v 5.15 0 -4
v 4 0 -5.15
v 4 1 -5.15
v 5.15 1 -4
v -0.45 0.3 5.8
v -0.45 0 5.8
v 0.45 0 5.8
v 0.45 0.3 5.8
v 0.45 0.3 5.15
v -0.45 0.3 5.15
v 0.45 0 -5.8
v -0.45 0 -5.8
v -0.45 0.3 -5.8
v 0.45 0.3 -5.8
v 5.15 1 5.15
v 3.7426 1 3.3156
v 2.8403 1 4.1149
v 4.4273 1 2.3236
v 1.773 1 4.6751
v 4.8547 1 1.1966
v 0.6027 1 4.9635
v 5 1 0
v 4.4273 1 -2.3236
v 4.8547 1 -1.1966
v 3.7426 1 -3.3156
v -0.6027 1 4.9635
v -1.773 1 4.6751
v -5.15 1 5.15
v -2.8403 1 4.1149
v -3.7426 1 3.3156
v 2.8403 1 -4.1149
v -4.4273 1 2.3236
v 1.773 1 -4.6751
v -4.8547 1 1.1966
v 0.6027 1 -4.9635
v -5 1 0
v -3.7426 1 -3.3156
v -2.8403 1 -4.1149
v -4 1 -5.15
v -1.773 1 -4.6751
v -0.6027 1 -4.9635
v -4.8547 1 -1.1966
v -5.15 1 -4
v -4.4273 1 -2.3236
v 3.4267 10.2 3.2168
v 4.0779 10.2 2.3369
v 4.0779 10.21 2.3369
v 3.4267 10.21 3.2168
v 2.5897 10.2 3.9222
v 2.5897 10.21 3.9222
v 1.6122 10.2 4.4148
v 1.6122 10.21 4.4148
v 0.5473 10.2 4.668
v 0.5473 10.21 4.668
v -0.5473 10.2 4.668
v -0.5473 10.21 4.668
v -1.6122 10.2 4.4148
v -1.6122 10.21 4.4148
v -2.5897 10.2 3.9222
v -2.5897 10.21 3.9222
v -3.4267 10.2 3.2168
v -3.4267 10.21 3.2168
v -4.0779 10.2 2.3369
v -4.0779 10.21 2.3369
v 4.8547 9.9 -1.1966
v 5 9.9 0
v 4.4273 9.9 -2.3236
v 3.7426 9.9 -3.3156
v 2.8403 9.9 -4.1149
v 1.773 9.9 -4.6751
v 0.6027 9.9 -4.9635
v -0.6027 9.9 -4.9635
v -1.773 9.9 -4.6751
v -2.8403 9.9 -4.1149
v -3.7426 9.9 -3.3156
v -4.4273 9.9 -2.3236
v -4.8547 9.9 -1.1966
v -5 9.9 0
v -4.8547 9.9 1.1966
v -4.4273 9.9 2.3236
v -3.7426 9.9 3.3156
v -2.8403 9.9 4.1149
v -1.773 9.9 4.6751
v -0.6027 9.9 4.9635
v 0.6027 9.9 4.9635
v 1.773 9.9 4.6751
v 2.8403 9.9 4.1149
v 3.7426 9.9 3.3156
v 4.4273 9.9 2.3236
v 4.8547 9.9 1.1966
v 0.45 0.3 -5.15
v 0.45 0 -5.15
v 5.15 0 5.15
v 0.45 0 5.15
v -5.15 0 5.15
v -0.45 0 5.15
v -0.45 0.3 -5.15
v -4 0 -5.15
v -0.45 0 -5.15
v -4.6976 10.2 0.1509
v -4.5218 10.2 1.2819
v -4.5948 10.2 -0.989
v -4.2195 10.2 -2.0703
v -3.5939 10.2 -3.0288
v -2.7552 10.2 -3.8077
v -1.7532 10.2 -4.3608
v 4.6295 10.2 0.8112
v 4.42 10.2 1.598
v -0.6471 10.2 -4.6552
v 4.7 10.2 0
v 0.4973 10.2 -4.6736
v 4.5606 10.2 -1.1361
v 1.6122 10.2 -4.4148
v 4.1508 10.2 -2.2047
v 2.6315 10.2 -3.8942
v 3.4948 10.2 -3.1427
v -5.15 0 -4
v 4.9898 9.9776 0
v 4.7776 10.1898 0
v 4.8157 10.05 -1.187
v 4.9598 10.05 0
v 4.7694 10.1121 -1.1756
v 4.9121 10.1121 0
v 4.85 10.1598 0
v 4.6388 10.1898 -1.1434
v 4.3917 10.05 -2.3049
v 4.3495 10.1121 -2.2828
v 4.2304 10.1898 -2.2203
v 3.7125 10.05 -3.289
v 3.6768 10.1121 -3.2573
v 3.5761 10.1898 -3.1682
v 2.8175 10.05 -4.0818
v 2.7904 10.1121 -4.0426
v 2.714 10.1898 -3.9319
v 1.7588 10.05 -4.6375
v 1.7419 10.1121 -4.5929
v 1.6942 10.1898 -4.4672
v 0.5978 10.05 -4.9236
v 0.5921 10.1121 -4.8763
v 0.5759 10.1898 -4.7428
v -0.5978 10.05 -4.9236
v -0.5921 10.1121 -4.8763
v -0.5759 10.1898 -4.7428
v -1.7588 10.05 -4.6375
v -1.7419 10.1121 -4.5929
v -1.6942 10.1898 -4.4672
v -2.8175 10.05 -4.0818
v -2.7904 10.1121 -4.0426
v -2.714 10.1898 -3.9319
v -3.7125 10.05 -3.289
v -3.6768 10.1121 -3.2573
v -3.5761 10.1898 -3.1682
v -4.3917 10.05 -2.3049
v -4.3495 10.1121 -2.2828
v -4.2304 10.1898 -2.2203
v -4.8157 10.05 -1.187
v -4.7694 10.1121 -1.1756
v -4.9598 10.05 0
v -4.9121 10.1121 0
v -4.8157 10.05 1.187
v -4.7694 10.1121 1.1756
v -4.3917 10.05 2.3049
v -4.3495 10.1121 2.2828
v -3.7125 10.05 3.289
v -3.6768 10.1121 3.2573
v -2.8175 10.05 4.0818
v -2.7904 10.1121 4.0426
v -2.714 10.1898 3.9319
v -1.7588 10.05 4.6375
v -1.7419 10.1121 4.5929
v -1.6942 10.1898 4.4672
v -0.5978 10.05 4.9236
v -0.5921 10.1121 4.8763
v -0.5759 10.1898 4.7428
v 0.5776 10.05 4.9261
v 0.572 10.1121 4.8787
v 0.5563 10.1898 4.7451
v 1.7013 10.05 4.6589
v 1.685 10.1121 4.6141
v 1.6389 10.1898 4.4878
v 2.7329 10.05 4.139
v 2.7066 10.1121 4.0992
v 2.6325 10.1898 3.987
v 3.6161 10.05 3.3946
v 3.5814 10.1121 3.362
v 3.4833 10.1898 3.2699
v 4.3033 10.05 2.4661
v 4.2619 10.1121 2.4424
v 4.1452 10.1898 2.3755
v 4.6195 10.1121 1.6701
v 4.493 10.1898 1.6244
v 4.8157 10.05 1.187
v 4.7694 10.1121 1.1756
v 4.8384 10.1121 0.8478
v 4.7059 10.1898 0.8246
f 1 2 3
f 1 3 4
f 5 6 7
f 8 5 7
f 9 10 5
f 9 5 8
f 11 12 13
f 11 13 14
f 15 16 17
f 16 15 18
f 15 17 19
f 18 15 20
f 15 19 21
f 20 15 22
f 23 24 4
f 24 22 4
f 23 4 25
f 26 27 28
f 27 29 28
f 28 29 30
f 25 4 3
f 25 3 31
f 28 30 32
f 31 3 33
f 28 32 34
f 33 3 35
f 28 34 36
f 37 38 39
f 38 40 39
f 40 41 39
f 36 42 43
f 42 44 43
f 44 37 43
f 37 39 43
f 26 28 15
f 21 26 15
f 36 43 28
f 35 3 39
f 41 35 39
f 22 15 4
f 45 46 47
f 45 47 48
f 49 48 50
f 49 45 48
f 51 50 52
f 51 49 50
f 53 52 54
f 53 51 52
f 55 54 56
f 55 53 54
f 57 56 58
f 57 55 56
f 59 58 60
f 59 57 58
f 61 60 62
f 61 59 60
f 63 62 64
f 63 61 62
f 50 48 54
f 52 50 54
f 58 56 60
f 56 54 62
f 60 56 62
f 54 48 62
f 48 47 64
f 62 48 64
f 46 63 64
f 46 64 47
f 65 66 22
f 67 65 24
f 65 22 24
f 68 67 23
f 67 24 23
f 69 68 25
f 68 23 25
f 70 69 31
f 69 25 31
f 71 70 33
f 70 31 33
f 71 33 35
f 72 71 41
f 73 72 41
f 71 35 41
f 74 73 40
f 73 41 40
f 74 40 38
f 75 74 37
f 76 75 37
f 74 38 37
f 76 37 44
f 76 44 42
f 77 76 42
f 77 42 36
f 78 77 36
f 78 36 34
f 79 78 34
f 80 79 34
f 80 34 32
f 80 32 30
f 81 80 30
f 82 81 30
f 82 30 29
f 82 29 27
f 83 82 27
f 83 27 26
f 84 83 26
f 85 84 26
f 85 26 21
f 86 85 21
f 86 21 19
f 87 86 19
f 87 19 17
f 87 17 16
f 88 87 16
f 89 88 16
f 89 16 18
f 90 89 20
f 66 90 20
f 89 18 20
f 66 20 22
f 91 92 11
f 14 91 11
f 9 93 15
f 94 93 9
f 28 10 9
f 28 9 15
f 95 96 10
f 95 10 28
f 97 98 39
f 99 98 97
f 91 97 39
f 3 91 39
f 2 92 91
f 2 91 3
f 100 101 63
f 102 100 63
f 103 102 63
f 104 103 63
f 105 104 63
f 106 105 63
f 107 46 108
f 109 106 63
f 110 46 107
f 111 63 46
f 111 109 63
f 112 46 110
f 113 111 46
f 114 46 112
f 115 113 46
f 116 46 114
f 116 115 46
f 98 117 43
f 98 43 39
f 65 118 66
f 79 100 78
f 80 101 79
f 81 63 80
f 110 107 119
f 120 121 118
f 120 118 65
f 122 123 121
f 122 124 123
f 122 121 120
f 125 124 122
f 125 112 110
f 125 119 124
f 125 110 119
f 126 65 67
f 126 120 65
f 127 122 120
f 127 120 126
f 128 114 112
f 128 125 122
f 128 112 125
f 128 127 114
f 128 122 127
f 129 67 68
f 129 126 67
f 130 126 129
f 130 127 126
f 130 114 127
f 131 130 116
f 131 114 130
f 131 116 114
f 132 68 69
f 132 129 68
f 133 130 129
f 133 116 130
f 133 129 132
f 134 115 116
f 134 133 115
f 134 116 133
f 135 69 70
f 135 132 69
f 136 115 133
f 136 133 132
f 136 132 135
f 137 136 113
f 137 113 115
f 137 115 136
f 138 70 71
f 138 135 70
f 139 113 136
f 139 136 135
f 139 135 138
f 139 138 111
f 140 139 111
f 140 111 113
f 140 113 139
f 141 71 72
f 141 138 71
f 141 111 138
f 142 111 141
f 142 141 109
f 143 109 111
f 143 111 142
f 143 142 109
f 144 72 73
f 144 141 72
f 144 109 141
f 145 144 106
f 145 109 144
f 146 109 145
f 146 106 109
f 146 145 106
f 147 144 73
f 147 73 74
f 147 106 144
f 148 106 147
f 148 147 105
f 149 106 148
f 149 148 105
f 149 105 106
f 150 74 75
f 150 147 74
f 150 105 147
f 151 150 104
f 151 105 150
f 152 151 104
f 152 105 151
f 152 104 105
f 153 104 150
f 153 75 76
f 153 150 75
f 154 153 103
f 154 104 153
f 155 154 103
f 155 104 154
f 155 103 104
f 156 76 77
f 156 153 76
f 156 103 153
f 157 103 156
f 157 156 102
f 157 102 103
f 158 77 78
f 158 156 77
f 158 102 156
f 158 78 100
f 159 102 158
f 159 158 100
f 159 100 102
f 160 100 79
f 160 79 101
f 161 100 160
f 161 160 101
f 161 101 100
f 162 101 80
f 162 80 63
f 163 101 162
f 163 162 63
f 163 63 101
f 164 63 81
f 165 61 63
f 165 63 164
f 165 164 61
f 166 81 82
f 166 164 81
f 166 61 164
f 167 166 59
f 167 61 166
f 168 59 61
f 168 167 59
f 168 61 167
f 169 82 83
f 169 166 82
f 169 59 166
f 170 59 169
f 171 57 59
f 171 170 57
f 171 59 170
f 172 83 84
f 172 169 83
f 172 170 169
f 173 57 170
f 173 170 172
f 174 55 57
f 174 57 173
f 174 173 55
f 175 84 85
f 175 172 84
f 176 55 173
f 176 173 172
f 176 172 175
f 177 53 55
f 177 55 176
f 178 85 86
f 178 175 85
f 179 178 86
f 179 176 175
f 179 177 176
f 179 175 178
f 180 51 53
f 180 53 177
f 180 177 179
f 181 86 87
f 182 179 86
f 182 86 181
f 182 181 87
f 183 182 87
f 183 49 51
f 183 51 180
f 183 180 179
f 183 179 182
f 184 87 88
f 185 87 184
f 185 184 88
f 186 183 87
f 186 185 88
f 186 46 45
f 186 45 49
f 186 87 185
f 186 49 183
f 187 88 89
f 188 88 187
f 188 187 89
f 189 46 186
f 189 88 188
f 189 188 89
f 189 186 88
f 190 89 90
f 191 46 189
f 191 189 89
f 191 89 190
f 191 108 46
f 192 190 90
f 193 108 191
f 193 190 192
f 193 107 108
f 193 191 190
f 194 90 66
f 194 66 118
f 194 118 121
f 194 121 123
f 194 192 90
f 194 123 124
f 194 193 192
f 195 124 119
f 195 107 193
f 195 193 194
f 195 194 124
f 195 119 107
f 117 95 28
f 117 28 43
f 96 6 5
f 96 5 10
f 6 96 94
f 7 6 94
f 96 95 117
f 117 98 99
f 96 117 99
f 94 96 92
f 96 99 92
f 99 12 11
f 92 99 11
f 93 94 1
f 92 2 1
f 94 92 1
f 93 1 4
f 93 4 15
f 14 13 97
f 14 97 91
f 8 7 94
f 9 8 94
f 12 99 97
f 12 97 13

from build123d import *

# Parameters (mm, degrees)
BOSS_EXTRUDE1_DEPTH = 1
SKETCH3_R           = 5
BOSS_EXTRUDE2_DEPTH = 10.2
FILLET1_R           = 0.3
SKETCH4_W           = 0.9
SKETCH4_H           = 3.5
BOSS_EXTRUDE3_DEPTH = 0.3
BOSS_EXTRUDE4_DEPTH = 0.01


with BuildPart() as part:
    # Sketch2 → Boss-Extrude1 (new body)
    with BuildSketch(Plane(origin=(0, 0, 0), x_dir=(1, 0, 0), z_dir=(0, 1, 0))):
        Polygon((5.15, -5.15), (-5.15, -5.15), (-5.15, 4), (-4, 5.15), (4, 5.15), (5.15, 4), align=None)
    extrude(amount=BOSS_EXTRUDE1_DEPTH)

    # Sketch3 → Boss-Extrude2 (add)
    with BuildSketch(Plane(origin=(0, 0, 0), x_dir=(1, 0, 0), z_dir=(0, 1, 0))):
        Circle(SKETCH3_R)
    extrude(amount=BOSS_EXTRUDE2_DEPTH)

    # Fillet1
    fillet1_edges = [part.edges().sort_by_distance(p)[0] for p in [
        (-5, 10.2, 0),
    ]]
    fillet(fillet1_edges, radius=FILLET1_R)

    # Sketch4 → Boss-Extrude3 (add)
    with BuildSketch(Plane(origin=(0, 0, 0), x_dir=(1, 0, 0), z_dir=(0, 1, 0))):
        with Locations((0, 4.05)):
            Rectangle(SKETCH4_W, SKETCH4_H)
        with Locations((0, -4.05)):
            Rectangle(SKETCH4_W, SKETCH4_H)
    extrude(amount=BOSS_EXTRUDE3_DEPTH)

    # Sketch5 → Boss-Extrude4 (add)
    with BuildSketch(Plane(origin=(0, 10.2, 0), x_dir=(1, 0, 0), z_dir=(0, 1, 0))):
        with BuildLine():
            Line((-4.077855221, -2.336898969), (4.077855221, -2.336898969))
            ThreePointArc((4.077855221, -2.336898969), (0, -4.7), (-4.077855221, -2.336898969))
        make_face()
    extrude(amount=BOSS_EXTRUDE4_DEPTH)


solid = part.part
